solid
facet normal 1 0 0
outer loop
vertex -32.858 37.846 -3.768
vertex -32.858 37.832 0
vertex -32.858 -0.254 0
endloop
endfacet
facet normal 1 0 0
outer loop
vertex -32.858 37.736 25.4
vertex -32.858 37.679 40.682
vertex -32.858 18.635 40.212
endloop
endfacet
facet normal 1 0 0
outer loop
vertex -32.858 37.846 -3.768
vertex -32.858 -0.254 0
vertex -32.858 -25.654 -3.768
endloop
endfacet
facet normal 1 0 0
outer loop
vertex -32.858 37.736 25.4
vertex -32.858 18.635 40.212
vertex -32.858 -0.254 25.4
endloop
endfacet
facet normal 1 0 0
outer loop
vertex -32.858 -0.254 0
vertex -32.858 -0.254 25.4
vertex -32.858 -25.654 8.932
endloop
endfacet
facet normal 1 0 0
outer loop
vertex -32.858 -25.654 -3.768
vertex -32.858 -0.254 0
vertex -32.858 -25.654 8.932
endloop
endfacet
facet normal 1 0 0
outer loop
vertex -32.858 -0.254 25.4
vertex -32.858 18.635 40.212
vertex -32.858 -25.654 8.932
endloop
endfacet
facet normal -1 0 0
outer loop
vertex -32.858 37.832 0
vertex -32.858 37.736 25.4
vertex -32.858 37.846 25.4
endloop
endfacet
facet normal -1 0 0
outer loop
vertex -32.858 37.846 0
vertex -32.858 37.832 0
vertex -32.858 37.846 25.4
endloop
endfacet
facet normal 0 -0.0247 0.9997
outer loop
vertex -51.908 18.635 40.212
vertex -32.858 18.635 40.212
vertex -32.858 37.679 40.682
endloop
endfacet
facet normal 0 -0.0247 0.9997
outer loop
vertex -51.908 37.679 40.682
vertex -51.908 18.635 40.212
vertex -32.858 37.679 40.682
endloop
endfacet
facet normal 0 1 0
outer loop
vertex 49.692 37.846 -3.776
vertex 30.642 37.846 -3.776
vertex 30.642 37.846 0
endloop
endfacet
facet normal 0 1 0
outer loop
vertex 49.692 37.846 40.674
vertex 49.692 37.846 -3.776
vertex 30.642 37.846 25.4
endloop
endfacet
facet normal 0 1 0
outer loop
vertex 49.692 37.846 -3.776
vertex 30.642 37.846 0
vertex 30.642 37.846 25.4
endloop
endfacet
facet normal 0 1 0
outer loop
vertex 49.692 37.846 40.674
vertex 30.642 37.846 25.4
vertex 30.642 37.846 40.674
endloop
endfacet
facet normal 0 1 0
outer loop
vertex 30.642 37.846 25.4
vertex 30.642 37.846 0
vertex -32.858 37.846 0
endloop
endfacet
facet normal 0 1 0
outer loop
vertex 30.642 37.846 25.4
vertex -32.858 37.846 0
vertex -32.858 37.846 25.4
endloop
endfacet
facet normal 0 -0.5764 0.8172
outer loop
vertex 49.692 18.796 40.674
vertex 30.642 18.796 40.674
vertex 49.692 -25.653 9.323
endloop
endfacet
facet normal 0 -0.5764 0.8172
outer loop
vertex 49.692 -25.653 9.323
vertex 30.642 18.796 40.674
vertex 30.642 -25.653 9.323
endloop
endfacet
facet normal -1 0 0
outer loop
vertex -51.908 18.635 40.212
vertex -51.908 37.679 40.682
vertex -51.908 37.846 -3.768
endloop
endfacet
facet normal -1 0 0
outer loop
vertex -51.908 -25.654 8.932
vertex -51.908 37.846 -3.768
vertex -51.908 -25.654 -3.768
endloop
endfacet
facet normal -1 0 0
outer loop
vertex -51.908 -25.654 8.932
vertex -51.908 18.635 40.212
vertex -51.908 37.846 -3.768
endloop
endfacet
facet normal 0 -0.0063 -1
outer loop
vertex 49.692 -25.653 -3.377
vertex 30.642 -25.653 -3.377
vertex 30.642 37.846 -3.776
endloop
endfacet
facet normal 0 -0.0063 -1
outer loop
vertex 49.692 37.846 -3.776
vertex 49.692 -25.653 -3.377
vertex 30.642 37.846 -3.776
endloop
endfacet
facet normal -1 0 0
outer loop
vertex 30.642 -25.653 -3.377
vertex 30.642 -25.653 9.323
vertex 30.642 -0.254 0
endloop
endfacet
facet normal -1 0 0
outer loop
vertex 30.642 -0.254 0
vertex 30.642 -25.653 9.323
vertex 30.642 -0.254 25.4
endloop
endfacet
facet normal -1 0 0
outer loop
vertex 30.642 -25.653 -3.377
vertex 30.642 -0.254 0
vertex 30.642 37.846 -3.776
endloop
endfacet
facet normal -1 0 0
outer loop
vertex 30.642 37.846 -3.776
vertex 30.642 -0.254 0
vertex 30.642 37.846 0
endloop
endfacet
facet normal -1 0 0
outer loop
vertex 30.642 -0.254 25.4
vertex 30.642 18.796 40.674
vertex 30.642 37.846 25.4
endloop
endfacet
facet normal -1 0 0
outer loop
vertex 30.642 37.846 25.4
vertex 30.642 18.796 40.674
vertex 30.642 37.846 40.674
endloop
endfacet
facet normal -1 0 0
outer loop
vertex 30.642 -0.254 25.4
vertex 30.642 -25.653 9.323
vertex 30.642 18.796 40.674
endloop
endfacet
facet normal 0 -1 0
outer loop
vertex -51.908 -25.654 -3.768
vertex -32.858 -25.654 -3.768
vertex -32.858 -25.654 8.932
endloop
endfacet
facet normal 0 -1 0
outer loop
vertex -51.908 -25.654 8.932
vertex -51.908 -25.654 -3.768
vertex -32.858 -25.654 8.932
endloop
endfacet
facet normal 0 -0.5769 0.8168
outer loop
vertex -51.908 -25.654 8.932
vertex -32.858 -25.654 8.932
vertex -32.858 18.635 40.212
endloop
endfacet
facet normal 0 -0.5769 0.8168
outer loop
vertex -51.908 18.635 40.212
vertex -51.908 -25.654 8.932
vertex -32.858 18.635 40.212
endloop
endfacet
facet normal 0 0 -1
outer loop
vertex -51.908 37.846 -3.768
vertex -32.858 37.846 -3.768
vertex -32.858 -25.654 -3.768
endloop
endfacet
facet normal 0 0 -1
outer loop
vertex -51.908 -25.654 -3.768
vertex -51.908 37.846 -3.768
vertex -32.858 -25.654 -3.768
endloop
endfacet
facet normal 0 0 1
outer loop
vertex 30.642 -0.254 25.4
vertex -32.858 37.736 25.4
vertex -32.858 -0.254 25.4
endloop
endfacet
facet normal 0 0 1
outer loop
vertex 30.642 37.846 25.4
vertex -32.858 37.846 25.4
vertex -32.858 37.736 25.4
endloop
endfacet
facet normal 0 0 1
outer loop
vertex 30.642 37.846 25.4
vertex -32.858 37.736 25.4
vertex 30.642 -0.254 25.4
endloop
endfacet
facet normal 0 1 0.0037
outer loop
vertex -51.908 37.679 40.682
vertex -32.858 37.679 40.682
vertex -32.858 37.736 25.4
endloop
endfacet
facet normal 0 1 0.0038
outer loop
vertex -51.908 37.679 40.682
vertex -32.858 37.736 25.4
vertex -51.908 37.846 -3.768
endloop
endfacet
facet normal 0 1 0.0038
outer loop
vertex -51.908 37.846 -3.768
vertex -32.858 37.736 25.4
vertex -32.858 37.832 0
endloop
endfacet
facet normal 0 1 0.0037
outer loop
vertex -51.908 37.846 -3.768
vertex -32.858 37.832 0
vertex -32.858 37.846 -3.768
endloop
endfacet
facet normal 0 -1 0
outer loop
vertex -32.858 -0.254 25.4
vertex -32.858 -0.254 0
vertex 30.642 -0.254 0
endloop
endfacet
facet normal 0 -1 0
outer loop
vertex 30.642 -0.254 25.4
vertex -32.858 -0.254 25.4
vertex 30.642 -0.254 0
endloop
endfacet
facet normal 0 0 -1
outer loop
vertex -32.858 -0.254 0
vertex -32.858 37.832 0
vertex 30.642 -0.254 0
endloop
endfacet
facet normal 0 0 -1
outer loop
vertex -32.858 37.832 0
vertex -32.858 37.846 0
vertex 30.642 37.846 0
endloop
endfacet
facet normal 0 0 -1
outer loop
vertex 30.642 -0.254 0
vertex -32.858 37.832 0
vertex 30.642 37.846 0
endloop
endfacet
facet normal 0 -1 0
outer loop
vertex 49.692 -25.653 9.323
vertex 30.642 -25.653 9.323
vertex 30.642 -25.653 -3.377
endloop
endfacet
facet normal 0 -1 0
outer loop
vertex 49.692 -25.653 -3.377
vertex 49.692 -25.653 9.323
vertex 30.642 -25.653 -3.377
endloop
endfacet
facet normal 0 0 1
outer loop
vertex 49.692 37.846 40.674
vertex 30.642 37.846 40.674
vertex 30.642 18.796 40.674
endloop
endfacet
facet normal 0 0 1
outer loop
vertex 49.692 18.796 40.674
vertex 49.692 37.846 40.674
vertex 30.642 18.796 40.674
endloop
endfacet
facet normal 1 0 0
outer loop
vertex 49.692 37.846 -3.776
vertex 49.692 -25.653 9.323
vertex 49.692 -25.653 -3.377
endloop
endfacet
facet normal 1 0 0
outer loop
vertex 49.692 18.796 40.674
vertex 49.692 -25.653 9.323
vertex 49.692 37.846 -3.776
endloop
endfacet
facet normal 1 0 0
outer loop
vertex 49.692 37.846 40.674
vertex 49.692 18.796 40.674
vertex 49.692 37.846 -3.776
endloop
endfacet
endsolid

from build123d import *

# Parameters (mm, degrees)
F0_W     = 63.5
F0_H     = 38.1
F1_DEPTH = 25.4
F3_DEPTH = 19.05
F5_DEPTH = 19.05


with BuildPart() as f1:
    # F0 (on Top) → F1 (new body)
    with BuildSketch(Plane.XY):
        with Locations((-1.108171, 18.795629)):
            Rectangle(F0_W, F0_H)
    extrude(amount=F1_DEPTH)

    # F2 (on face) → F3 (join)
    with BuildSketch(Plane.YZ.offset(30.641829)):
        Polygon((37.845629, -3.775676), (37.845629, 0), (37.845629, 40.674324), (18.795629, 40.674324), (-25.653121, 9.322739), (-25.653121, -3.377261), align=None)
    extrude(amount=F3_DEPTH)

    # F4 (on face) → F5 (join)
    with BuildSketch(Plane(origin=(-32.858171, 0, 0), x_dir=(0, -1, 0), z_dir=(-1, 0, 0))):
        Polygon((-18.634845, 40.211677), (-37.67904, 40.681904), (-37.845629, -3.767784), (25.654371, -3.767784), (25.654371, 8.932216), align=None)
    extrude(amount=F5_DEPTH)


solid = f1.part
